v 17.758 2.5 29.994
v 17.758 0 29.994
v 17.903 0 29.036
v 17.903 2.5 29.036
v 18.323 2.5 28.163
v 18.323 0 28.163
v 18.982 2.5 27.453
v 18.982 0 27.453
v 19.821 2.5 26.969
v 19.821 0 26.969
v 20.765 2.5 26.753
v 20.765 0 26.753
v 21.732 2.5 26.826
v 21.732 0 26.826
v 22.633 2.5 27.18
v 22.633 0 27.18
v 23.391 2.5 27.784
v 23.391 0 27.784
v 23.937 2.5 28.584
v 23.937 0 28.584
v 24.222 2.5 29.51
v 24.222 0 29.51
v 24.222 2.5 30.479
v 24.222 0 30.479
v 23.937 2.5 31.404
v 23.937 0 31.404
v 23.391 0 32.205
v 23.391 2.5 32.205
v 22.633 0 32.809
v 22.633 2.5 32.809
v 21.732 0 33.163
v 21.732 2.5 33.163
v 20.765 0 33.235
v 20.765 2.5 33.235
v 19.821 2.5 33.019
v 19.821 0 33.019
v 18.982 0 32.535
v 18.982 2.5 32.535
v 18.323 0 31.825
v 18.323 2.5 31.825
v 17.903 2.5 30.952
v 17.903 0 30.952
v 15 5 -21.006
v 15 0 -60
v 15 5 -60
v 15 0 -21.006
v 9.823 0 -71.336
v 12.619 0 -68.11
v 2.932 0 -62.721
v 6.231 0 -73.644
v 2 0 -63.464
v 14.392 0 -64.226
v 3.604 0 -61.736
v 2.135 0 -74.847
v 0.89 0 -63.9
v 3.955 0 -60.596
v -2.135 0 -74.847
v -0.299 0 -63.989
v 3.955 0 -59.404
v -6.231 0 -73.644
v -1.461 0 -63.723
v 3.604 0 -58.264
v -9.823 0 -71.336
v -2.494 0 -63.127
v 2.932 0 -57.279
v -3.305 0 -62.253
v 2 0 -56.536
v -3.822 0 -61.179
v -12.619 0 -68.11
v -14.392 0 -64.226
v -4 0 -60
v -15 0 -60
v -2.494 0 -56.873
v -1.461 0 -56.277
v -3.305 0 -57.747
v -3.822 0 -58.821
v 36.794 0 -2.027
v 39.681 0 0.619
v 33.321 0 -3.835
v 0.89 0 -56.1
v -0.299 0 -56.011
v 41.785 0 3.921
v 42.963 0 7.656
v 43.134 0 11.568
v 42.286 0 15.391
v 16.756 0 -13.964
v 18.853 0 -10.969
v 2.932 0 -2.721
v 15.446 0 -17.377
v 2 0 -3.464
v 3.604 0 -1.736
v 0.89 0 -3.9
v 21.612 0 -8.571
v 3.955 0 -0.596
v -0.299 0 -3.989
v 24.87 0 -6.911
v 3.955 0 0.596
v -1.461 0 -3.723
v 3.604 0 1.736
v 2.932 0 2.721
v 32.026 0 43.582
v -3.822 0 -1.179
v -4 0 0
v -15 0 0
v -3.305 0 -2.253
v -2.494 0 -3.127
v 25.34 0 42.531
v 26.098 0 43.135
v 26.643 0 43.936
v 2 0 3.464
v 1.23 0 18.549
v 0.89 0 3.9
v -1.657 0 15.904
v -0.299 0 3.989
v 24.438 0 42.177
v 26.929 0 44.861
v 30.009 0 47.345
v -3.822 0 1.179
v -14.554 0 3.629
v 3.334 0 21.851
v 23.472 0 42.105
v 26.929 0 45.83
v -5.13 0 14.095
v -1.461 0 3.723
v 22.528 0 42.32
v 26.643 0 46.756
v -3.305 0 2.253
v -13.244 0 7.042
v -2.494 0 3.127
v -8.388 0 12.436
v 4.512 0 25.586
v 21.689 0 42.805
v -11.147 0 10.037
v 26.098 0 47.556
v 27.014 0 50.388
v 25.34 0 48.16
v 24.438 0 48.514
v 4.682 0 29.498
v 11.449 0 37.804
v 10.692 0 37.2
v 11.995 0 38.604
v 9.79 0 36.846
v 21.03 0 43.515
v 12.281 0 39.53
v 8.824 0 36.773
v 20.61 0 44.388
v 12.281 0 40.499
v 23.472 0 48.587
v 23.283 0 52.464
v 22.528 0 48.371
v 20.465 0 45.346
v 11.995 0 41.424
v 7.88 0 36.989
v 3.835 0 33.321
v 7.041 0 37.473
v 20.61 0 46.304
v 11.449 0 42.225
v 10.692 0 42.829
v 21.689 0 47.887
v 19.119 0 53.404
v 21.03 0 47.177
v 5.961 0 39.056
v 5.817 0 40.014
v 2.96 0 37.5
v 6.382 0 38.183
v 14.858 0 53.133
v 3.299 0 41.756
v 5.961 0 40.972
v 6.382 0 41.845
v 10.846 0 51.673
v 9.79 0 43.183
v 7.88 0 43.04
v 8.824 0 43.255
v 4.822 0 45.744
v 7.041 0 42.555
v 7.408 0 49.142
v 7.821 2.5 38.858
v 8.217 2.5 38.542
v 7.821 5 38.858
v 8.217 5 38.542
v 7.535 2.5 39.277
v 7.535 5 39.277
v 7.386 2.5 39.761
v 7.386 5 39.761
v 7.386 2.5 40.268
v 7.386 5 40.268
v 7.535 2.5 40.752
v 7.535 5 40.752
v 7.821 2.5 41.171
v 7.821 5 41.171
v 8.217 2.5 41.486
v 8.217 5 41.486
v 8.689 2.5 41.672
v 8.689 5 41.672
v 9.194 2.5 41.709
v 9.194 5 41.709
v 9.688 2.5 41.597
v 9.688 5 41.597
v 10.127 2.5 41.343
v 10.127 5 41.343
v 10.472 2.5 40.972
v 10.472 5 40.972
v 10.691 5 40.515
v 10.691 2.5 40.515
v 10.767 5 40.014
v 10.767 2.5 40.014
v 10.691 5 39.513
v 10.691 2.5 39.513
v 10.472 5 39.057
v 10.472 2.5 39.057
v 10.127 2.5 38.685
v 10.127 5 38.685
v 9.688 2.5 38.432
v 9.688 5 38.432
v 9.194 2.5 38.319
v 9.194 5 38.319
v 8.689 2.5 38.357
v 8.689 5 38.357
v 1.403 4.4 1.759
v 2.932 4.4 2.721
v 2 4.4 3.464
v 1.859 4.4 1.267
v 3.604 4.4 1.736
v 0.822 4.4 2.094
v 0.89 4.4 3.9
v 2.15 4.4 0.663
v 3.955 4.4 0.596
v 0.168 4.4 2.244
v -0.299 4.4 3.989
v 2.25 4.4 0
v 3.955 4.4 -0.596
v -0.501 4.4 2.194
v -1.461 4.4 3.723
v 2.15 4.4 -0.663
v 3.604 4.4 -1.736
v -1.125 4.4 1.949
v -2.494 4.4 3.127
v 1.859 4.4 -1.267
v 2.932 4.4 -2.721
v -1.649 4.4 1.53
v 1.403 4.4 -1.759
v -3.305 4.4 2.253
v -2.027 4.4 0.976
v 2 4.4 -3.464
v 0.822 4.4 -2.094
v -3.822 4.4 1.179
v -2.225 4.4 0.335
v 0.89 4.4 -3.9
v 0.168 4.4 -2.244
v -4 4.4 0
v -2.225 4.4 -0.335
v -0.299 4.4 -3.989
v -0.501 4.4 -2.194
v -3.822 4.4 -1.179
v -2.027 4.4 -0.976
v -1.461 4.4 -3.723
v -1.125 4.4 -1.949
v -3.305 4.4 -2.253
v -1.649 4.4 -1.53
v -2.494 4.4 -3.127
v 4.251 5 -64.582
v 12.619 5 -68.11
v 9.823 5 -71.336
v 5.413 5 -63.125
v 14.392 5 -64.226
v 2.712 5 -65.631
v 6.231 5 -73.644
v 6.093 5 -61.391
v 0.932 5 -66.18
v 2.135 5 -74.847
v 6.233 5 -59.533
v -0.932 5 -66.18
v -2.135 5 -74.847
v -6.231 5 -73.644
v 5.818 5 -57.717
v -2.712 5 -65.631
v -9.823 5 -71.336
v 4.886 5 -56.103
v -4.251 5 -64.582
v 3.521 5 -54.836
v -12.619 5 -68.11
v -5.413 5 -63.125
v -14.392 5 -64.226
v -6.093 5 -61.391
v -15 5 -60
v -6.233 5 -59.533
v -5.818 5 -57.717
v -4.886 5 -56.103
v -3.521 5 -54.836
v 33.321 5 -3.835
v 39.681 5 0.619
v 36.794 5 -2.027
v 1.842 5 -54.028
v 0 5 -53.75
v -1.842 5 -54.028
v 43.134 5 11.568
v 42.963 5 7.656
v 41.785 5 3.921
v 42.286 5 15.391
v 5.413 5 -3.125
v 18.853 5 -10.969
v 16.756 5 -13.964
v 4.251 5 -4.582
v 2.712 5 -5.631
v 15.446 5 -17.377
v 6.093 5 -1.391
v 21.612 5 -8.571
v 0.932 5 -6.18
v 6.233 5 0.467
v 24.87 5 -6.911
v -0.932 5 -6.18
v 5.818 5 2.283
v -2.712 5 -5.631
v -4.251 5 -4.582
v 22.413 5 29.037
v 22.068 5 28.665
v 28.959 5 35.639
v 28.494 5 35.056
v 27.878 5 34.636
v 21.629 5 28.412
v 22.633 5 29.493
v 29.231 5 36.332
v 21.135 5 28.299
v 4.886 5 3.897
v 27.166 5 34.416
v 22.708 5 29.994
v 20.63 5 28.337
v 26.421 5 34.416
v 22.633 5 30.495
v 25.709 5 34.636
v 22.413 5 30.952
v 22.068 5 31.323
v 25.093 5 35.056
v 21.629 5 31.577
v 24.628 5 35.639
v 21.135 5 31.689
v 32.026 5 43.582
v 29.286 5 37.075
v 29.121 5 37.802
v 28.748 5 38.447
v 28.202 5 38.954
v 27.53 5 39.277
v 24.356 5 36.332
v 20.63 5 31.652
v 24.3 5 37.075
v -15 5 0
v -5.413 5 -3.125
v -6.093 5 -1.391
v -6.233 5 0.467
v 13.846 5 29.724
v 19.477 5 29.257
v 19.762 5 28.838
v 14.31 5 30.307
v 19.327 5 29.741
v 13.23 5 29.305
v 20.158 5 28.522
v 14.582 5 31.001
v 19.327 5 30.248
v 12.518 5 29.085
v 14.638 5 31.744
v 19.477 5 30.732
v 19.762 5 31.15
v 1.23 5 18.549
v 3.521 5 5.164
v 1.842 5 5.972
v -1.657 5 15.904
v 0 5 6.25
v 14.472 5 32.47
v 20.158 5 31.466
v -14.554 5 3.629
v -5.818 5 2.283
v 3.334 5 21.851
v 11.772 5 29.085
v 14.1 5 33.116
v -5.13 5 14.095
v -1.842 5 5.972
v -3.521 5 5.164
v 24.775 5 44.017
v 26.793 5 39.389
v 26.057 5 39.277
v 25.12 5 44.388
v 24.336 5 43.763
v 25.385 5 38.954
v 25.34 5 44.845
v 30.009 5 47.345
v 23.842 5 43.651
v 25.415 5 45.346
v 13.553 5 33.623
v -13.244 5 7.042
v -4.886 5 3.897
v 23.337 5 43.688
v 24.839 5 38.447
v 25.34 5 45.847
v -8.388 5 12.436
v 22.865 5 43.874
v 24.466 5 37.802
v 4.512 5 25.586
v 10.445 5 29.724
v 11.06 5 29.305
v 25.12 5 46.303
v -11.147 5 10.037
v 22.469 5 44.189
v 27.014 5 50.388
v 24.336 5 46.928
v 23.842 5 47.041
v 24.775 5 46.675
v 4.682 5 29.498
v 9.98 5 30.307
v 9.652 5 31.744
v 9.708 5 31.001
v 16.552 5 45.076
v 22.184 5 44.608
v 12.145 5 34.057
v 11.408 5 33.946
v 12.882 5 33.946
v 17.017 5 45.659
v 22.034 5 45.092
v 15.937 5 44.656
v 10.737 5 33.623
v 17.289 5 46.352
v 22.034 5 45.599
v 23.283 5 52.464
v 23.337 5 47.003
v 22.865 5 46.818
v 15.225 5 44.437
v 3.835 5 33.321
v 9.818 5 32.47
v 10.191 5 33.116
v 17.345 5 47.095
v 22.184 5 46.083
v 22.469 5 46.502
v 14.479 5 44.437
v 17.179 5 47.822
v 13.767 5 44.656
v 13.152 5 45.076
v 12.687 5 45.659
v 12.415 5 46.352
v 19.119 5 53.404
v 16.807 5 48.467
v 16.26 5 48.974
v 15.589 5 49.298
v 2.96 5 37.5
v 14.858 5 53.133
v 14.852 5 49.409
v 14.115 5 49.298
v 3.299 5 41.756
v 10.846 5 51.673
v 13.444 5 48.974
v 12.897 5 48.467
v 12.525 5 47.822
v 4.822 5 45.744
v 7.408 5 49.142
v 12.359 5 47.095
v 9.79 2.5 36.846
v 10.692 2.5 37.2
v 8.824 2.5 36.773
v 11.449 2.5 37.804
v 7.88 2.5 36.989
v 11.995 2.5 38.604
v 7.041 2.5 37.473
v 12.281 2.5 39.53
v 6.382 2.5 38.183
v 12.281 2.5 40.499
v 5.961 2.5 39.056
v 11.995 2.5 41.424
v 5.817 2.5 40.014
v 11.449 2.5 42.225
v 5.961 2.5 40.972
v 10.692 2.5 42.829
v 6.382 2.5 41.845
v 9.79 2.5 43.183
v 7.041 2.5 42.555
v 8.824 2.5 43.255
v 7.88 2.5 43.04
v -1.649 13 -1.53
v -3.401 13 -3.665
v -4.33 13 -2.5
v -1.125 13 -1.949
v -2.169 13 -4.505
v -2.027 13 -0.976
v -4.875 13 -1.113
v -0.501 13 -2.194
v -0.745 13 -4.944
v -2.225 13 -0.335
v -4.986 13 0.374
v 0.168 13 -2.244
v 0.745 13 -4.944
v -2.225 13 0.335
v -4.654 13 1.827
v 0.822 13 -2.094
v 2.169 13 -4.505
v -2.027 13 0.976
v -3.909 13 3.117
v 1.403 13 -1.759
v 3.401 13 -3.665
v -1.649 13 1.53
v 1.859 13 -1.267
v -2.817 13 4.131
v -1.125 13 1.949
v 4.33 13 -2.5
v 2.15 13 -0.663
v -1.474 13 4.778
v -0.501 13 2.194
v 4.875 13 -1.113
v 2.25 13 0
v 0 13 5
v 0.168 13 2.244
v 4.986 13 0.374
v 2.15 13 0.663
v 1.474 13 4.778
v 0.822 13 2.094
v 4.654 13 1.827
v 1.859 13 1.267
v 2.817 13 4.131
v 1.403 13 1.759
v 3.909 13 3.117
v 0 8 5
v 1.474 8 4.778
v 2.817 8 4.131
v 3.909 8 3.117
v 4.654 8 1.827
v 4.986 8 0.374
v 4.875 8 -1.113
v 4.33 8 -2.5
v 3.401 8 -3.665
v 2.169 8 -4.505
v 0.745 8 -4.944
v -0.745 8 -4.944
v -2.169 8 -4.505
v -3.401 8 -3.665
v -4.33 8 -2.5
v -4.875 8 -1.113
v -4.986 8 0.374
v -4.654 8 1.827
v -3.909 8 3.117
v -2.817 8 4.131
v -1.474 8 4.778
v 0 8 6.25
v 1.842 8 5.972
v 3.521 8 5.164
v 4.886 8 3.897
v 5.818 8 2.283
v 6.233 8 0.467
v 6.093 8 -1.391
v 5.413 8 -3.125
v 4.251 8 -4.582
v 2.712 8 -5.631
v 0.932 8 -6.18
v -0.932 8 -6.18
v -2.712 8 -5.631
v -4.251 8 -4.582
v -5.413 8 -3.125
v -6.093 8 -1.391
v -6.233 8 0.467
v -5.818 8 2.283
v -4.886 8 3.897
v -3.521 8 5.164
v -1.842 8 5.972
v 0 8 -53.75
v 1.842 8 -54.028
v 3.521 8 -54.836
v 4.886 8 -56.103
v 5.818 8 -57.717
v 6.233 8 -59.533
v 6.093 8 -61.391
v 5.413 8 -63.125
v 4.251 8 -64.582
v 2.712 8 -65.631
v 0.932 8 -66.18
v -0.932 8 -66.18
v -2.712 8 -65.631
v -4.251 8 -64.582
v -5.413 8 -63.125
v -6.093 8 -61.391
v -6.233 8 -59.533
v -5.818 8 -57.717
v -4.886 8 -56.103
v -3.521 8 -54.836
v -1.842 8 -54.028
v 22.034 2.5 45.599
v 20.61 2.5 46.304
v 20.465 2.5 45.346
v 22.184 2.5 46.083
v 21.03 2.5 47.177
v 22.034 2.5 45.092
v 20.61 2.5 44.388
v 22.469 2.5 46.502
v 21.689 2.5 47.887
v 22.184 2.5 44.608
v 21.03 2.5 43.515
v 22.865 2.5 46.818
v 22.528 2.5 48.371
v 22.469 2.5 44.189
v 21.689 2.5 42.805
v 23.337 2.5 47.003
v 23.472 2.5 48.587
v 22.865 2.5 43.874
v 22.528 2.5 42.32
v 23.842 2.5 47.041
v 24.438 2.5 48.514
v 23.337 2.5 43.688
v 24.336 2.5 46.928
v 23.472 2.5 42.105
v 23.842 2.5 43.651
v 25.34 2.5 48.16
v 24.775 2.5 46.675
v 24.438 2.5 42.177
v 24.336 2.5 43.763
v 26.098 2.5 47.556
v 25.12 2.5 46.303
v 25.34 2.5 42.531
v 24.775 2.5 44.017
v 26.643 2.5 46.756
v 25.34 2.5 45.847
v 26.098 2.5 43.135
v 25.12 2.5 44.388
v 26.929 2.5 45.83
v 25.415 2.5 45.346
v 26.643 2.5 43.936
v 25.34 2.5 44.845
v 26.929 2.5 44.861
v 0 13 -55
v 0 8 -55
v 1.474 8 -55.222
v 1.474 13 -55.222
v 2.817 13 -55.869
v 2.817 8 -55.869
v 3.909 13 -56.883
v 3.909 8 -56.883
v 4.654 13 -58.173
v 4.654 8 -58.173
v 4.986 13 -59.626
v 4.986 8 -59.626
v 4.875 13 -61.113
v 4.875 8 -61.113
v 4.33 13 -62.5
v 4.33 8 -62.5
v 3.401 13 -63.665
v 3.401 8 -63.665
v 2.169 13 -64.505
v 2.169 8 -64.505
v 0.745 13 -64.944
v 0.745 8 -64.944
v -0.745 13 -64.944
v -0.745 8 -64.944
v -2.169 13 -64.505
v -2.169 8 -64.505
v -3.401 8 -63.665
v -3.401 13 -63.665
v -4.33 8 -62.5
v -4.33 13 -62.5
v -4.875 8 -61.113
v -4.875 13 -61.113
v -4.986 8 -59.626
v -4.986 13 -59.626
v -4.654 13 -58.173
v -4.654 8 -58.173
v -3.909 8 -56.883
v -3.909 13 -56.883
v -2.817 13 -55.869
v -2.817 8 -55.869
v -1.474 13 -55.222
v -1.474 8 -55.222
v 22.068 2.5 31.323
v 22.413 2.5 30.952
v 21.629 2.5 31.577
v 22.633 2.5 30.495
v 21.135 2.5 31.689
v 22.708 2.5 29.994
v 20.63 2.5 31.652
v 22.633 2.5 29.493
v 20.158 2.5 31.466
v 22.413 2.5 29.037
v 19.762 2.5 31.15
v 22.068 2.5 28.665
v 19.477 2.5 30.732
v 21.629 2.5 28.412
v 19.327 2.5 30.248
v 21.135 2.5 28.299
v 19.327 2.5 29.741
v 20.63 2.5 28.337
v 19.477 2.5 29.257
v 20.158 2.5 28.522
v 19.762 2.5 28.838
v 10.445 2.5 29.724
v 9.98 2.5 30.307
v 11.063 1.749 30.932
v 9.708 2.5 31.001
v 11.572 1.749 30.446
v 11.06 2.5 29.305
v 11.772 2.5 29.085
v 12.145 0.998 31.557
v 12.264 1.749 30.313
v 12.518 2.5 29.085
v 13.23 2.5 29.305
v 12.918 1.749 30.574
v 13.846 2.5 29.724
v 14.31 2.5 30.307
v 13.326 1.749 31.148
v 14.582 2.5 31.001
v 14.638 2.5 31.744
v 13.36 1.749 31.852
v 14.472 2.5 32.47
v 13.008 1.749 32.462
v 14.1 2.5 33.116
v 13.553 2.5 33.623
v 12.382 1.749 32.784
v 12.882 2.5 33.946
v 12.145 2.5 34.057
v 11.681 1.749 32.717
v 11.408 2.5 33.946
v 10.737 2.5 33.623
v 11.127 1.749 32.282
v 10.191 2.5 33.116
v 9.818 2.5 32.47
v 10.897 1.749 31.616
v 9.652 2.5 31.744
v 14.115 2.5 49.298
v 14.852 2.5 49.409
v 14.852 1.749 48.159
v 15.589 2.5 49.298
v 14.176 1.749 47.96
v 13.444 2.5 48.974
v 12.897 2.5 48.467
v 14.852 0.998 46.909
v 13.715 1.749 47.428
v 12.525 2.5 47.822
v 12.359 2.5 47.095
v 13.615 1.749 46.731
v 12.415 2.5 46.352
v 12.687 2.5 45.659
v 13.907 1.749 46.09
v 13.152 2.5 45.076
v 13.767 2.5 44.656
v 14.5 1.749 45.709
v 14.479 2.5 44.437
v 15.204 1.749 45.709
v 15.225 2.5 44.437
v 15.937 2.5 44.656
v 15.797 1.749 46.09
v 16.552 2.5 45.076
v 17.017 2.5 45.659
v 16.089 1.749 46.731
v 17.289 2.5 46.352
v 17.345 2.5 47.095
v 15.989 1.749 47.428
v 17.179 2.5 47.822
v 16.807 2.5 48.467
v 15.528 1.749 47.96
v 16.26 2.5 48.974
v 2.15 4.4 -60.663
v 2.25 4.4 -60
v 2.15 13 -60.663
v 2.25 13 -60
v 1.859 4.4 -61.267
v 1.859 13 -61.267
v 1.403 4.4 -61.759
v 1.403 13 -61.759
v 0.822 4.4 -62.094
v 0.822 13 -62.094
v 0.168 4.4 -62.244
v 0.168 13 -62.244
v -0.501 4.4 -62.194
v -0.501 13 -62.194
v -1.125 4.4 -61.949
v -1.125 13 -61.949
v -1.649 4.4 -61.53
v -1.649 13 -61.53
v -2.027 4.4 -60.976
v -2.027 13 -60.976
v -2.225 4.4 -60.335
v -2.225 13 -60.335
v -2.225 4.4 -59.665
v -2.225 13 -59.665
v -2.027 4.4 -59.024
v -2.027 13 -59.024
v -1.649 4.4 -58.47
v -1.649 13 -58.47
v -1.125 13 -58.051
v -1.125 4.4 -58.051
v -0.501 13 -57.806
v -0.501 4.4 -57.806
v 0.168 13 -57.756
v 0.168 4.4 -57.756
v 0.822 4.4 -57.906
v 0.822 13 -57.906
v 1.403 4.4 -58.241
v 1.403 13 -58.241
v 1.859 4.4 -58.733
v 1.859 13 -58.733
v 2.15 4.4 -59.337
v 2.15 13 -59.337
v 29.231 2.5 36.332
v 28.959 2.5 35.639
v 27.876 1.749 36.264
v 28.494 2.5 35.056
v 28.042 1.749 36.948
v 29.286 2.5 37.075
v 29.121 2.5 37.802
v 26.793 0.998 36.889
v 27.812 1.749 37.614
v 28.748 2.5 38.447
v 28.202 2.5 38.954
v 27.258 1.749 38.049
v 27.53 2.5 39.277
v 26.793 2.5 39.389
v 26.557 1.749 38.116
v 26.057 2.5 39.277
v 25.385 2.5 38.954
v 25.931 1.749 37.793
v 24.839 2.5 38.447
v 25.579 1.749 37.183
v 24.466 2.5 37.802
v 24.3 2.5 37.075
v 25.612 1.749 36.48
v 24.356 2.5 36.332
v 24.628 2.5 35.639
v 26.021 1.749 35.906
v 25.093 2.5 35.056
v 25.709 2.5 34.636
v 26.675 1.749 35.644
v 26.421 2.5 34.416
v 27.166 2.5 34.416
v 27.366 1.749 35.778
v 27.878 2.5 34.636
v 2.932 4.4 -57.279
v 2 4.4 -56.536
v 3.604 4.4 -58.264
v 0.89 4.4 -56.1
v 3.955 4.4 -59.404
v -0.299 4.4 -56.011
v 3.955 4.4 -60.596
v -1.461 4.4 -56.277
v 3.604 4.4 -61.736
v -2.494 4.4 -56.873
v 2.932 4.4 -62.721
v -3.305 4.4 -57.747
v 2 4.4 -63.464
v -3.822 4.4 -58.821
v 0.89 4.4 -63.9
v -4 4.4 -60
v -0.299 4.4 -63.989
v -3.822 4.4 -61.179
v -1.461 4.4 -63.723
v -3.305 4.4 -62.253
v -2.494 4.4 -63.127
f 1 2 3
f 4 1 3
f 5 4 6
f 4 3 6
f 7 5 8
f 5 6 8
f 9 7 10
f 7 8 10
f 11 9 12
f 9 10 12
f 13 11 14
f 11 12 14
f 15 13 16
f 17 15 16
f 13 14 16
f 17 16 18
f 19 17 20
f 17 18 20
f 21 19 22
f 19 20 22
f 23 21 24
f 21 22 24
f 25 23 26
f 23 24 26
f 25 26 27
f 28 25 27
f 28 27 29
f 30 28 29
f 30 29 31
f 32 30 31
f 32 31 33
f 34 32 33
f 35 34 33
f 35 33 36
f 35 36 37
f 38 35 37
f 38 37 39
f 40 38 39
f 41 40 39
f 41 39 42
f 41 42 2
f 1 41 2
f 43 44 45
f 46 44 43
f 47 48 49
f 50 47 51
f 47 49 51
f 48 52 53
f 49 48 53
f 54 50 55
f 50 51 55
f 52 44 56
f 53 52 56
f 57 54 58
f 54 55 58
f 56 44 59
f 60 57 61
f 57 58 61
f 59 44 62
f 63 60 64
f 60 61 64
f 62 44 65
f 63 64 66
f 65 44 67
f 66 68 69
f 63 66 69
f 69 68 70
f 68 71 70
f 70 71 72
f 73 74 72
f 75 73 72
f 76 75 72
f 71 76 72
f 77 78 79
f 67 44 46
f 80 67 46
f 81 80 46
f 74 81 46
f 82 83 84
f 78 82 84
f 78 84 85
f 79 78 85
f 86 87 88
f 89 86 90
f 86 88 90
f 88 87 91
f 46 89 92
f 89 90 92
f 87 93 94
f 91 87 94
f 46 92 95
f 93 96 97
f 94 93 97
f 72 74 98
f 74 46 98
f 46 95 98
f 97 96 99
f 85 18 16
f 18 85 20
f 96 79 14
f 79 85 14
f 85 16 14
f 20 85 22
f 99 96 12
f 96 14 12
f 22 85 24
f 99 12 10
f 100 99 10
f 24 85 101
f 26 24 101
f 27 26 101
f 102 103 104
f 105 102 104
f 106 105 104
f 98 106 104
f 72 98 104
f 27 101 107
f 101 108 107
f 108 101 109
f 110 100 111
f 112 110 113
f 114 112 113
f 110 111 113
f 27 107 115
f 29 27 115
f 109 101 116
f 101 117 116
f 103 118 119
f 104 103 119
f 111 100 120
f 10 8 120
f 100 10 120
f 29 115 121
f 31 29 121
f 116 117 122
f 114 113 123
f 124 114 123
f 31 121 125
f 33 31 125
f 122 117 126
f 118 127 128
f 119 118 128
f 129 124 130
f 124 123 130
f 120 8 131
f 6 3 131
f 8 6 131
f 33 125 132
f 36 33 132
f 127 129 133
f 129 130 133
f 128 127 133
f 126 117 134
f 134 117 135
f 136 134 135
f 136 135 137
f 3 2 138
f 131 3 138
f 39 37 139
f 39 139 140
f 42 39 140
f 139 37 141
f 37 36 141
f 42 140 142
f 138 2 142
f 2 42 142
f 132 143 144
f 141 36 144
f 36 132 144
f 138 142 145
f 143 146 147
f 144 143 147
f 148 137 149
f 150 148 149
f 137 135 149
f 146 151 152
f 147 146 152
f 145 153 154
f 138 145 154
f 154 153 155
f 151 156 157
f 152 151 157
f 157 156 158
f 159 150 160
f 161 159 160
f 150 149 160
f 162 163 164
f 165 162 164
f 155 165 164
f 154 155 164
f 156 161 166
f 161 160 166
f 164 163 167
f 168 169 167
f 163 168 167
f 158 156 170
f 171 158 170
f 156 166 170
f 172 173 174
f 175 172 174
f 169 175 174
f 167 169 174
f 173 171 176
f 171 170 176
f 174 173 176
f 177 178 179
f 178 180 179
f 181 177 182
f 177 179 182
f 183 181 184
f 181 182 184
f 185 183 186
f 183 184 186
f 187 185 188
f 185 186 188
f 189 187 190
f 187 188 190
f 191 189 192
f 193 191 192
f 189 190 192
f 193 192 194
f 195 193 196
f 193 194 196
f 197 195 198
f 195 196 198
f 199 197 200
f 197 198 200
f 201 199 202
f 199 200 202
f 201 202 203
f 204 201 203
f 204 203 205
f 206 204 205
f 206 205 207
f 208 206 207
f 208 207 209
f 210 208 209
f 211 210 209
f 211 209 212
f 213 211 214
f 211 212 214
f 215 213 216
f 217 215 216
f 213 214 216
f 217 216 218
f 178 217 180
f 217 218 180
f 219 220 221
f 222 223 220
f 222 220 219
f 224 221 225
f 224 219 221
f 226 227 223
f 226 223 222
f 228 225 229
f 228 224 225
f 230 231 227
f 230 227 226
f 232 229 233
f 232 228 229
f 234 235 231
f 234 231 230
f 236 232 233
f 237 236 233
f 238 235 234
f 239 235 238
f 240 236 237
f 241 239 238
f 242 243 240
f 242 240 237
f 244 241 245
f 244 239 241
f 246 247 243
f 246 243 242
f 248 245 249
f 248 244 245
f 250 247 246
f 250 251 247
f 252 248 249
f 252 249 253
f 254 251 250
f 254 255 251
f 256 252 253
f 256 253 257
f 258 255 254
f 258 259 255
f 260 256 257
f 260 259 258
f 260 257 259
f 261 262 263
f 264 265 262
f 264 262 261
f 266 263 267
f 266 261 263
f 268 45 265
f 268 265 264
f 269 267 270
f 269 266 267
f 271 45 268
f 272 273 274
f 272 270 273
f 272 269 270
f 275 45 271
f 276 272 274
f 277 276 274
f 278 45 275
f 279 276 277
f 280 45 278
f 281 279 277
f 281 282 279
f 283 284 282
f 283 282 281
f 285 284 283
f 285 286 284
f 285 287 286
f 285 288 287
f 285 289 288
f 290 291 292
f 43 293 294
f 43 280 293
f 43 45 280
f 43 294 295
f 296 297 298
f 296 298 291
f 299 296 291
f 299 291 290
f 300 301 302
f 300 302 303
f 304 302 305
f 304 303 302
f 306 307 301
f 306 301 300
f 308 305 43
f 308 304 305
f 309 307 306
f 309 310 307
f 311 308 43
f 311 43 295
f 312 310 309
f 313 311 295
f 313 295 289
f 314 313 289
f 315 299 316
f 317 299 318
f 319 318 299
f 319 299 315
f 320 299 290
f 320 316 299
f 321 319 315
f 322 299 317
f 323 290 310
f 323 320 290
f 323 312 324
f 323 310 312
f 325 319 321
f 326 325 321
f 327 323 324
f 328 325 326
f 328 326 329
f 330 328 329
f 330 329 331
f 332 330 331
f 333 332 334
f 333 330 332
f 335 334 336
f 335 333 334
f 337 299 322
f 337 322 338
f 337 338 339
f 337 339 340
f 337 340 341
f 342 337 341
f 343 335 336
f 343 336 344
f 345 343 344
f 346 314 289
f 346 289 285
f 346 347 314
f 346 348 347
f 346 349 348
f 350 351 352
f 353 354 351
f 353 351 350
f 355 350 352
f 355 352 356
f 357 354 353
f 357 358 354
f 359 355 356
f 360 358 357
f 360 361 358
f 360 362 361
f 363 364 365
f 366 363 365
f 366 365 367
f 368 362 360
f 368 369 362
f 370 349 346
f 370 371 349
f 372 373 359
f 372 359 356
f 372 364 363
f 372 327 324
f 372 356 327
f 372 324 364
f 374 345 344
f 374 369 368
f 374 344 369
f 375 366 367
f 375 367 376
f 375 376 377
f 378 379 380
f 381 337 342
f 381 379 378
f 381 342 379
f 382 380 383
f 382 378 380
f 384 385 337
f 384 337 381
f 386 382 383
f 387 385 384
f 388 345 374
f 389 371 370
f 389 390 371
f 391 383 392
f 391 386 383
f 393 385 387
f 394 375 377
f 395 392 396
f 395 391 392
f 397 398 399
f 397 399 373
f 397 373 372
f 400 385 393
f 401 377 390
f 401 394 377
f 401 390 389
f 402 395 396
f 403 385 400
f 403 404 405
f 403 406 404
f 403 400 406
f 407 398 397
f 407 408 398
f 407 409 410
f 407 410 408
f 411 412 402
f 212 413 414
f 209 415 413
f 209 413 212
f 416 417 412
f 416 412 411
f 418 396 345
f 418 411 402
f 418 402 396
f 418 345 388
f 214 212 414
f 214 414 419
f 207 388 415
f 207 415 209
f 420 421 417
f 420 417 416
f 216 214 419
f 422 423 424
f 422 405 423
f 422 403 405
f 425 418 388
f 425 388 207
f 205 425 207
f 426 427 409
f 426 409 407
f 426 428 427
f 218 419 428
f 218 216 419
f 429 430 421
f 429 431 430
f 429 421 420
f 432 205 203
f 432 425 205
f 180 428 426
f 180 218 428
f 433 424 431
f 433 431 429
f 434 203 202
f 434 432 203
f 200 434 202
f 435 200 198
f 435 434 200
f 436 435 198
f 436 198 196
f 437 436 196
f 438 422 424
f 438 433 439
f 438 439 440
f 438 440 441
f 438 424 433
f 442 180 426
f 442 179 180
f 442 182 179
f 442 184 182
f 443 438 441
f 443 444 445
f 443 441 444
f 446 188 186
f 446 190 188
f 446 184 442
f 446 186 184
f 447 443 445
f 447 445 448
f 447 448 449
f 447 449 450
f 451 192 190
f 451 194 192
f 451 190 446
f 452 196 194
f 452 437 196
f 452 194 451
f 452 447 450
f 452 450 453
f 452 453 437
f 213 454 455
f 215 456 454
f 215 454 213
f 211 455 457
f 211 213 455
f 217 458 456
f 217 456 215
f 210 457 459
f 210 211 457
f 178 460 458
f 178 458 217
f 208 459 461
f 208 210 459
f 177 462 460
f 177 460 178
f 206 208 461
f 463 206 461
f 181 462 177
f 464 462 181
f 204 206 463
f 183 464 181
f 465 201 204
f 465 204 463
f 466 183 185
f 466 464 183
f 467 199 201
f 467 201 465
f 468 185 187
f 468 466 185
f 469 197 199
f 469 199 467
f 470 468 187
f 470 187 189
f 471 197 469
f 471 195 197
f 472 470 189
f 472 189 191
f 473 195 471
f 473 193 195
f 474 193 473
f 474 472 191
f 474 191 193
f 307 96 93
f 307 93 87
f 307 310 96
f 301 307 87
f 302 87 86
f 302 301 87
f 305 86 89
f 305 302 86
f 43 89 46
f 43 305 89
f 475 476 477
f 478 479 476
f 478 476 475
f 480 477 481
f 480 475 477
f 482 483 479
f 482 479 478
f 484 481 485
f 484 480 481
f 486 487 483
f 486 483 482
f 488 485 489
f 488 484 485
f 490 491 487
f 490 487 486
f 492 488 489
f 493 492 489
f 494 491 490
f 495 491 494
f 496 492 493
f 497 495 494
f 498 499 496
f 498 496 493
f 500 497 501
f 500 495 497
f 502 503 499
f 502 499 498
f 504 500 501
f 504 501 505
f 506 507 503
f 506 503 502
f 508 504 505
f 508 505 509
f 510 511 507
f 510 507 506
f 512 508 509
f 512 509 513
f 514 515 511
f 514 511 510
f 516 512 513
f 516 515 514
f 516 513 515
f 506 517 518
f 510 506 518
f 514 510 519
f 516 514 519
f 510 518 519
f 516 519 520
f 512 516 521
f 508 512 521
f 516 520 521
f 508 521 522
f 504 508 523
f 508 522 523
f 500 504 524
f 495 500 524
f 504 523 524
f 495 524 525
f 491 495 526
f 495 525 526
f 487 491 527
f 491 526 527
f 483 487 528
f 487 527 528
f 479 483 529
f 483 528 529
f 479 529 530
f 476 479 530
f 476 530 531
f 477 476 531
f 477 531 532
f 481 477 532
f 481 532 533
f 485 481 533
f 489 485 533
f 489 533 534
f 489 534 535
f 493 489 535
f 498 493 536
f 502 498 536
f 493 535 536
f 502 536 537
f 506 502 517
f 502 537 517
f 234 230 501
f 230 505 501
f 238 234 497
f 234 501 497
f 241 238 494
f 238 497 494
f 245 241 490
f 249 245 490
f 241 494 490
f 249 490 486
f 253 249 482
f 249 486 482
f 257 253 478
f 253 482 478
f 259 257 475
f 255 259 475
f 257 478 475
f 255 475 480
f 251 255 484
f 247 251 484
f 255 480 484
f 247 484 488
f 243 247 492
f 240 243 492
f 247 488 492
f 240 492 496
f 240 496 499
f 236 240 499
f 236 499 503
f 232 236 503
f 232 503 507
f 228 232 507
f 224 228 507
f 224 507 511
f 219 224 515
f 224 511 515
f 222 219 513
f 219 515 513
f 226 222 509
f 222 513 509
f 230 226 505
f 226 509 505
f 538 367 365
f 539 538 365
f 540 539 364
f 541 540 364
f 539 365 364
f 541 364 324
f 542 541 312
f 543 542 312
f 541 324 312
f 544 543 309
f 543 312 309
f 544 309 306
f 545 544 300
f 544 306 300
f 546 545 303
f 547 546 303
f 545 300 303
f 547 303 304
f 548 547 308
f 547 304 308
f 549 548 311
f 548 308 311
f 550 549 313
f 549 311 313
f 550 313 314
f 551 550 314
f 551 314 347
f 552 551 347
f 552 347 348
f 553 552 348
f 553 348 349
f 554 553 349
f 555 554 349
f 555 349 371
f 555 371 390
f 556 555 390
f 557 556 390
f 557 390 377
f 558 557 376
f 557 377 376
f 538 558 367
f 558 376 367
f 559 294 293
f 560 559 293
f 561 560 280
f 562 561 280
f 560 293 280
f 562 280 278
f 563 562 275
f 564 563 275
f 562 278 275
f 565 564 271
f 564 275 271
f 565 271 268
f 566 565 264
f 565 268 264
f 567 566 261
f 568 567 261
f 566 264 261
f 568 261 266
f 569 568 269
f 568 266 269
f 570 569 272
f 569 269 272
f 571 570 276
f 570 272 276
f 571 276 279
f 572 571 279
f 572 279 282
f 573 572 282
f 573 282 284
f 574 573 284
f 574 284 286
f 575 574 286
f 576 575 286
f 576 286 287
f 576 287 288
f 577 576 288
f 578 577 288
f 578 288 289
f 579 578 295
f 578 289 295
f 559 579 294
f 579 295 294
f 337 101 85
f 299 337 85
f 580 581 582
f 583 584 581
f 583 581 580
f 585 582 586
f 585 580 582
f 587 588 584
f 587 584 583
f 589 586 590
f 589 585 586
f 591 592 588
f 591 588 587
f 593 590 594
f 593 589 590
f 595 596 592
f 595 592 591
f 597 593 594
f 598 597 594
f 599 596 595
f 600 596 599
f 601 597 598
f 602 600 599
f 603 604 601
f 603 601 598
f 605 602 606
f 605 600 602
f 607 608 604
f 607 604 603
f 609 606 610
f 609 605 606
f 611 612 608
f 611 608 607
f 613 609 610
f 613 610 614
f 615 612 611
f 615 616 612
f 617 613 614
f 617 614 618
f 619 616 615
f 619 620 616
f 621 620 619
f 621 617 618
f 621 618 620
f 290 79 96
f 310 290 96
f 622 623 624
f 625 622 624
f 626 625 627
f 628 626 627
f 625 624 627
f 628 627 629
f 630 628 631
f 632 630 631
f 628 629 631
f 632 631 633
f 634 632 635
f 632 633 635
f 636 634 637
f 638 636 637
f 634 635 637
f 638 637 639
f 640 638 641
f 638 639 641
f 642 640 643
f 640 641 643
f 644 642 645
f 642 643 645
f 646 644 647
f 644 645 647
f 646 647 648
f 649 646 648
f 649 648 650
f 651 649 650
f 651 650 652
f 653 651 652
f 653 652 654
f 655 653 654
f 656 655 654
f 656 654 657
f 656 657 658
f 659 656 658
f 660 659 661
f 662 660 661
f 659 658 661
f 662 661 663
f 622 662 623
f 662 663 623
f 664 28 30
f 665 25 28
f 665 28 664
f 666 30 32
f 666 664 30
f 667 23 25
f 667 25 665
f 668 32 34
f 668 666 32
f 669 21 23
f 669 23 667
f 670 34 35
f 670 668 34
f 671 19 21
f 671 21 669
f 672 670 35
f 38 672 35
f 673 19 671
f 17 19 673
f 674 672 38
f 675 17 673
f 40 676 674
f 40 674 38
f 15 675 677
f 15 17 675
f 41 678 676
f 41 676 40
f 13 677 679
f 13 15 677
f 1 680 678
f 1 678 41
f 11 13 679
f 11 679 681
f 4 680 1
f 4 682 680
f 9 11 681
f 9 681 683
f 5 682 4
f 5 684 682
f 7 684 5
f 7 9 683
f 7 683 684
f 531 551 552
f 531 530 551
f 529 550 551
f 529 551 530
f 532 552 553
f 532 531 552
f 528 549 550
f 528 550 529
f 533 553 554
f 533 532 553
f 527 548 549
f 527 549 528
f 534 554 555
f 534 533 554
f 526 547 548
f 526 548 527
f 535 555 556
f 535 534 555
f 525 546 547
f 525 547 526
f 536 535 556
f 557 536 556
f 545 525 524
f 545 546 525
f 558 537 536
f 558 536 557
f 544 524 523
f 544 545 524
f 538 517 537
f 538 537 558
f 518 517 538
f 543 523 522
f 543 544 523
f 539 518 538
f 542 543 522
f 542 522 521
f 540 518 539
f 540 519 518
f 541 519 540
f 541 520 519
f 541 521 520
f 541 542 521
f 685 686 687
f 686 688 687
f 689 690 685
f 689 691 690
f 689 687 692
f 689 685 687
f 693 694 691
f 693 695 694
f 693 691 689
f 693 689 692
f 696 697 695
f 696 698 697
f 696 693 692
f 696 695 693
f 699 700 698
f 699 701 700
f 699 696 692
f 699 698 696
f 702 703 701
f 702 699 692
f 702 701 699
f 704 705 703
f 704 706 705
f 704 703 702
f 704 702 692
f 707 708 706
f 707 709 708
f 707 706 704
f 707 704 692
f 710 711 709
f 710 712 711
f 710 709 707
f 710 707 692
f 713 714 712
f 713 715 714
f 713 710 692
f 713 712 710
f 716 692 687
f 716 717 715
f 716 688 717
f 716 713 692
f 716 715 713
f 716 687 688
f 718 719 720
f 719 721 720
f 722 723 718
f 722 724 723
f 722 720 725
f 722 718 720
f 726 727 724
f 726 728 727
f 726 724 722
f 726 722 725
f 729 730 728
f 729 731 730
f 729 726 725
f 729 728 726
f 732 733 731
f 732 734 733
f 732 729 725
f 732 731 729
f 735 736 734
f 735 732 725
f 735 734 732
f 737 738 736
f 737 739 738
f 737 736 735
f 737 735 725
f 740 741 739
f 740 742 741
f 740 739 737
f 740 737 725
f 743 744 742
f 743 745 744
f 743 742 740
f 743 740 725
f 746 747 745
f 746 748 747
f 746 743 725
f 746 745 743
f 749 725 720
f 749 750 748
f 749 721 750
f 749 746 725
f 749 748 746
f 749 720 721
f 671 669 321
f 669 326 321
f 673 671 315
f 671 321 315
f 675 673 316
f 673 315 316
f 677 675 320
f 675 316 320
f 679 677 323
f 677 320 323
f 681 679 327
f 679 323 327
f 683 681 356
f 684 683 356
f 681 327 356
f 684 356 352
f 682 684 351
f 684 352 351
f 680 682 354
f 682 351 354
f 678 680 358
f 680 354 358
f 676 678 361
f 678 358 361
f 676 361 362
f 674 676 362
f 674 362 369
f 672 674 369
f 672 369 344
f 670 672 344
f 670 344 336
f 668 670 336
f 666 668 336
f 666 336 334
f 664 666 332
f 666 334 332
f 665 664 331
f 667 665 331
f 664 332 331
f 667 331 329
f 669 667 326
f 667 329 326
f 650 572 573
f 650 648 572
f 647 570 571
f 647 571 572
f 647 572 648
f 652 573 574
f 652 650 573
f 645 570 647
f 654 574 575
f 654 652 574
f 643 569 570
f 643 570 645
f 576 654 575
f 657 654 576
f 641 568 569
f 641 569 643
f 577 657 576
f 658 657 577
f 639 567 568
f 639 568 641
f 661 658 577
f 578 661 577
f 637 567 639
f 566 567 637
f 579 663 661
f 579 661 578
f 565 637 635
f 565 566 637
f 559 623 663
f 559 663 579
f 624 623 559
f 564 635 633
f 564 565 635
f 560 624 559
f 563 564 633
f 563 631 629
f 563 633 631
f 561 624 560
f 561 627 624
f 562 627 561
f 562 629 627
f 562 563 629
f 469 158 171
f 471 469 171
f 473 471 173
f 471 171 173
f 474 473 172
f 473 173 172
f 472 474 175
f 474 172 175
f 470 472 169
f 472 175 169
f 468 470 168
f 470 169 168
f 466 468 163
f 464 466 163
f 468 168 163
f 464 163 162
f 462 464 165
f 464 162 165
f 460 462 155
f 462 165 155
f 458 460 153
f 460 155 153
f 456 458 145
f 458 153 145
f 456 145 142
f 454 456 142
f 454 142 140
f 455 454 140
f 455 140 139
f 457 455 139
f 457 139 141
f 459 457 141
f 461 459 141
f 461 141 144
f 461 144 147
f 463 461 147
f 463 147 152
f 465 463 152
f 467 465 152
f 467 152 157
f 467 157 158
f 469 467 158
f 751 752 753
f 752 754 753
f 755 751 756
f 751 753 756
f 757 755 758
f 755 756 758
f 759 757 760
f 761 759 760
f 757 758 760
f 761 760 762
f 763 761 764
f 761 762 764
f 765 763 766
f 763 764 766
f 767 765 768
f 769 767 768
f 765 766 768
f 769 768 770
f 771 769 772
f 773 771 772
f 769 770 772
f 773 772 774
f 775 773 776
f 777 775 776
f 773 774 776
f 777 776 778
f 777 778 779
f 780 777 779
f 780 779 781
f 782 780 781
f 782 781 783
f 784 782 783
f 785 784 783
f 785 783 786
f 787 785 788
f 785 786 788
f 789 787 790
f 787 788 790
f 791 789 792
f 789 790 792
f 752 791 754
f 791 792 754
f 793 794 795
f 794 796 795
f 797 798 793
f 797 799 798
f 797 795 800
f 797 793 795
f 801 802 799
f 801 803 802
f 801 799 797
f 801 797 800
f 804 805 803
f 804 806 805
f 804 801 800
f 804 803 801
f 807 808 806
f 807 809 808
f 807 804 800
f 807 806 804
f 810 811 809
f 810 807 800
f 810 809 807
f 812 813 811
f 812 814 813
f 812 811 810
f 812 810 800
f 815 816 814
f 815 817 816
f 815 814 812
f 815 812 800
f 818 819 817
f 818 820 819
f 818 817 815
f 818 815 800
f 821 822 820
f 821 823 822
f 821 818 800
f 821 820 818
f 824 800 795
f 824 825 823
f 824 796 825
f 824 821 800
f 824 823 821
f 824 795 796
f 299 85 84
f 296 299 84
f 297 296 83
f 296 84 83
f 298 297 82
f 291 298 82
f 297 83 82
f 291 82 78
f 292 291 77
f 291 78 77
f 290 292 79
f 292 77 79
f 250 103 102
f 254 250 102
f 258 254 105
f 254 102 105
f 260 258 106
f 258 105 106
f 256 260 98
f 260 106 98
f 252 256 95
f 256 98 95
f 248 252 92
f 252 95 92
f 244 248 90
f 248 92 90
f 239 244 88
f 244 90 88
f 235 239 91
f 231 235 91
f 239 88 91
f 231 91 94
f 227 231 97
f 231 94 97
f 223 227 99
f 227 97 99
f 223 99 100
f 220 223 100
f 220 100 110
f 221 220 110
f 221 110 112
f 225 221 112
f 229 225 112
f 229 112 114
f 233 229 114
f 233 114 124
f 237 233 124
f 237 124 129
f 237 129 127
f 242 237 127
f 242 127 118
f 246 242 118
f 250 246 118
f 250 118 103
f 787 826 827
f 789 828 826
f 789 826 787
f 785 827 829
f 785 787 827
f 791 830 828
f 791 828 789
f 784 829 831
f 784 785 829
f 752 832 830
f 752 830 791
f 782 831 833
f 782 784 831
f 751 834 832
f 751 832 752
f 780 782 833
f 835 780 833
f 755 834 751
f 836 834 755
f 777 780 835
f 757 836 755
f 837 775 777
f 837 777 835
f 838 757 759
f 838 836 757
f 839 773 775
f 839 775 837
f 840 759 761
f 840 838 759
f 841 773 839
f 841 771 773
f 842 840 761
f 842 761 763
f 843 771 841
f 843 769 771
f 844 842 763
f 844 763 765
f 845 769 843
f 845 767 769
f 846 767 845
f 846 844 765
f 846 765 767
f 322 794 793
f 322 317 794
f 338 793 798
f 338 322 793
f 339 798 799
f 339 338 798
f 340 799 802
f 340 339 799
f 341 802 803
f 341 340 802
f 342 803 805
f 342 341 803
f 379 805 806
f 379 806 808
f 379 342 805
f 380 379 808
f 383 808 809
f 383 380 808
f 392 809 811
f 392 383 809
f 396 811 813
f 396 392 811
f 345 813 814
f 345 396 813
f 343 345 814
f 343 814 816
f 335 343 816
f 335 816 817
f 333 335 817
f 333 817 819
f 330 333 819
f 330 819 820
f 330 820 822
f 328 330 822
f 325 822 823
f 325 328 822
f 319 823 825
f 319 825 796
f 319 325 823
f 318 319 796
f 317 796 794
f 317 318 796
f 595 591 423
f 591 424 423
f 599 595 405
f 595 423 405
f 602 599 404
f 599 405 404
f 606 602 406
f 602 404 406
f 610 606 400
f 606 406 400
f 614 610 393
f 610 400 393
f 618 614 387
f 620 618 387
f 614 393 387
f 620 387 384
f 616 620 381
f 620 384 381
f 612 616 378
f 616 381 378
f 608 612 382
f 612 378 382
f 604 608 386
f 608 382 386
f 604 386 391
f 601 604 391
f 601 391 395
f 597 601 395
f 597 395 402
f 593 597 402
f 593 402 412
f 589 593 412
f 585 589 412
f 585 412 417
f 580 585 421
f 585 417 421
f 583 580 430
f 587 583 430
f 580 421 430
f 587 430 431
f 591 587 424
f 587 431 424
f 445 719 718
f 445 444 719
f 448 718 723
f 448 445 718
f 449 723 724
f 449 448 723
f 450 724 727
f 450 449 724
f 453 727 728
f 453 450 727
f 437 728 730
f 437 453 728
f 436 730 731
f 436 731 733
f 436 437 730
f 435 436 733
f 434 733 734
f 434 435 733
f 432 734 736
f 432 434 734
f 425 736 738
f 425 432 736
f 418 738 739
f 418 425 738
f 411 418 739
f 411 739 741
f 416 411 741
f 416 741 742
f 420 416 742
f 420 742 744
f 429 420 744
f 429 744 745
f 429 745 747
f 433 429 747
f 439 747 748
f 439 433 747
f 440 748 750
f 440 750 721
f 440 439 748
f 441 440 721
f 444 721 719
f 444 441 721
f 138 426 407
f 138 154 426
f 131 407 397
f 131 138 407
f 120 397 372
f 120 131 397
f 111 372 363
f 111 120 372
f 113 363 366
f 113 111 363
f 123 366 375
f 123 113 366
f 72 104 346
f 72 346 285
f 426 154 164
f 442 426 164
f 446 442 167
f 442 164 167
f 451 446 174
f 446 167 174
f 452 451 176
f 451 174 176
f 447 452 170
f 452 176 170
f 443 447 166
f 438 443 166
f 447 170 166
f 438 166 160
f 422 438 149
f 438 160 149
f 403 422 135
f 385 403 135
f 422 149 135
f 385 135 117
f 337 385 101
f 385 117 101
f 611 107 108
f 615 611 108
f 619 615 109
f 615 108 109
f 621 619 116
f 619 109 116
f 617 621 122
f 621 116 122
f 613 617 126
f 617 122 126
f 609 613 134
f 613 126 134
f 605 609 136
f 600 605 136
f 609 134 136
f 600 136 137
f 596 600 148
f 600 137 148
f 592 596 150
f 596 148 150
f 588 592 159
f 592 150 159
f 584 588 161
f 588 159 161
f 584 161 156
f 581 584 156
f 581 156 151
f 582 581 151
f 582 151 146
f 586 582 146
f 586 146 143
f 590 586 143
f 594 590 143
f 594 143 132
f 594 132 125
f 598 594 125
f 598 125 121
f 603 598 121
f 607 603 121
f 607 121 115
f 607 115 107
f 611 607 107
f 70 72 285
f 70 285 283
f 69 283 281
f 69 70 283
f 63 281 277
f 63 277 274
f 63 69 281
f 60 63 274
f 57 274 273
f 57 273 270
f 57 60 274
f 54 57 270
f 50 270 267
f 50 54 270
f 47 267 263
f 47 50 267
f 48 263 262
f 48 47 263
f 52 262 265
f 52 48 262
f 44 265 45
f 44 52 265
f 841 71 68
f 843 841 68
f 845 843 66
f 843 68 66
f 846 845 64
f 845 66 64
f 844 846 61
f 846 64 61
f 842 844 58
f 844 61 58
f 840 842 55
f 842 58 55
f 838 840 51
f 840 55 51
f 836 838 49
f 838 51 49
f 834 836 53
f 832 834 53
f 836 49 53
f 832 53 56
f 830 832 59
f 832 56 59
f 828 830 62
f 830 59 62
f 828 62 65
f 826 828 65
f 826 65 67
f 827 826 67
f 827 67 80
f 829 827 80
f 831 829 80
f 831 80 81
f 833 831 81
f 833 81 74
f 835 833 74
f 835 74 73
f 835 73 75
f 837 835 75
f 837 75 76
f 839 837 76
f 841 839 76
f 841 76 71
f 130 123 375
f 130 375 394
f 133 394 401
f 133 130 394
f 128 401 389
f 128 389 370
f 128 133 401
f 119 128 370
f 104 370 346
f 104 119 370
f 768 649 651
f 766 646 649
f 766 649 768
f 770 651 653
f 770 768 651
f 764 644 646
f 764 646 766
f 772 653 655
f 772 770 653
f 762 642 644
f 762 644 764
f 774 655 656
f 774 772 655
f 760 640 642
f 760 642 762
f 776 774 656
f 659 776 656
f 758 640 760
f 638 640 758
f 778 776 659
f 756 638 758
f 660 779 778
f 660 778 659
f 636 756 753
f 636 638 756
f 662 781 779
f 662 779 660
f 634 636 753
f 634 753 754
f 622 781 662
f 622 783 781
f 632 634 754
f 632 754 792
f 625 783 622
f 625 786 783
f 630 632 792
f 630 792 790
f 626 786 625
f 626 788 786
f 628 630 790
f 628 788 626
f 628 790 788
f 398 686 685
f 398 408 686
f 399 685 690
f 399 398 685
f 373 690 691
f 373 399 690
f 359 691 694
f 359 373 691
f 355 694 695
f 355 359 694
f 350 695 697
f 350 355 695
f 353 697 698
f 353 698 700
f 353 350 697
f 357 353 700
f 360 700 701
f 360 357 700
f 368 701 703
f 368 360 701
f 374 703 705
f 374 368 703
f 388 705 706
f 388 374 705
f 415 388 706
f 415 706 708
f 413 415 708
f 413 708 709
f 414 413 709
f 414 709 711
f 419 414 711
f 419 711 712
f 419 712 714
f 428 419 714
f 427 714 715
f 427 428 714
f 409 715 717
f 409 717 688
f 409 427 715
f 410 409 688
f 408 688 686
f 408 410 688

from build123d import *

# Parameters (mm, degrees)
EXTRUDE_1_DEPTH              = 5
SKETCH_2_R                   = 6.25
EXTRUDE_2_DEPTH              = 3
SKETCH_3_R                   = 5
EXTRUDE_3_DEPTH              = 5
HOLE_WIZARD_M4_3_D           = 4.5
HOLE_WIZARD_M4_3_CBORE_D     = 8
HOLE_WIZARD_M4_3_CBORE_DEPTH = 4.4
EXTRUDE_4_DEPTH              = 5
EXTRUDE_5_DEPTH              = 5
HOLE_WIZARD_M4_2_D           = 4.5
HOLE_WIZARD_M4_2_CBORE_D     = 8
HOLE_WIZARD_M4_2_CBORE_DEPTH = 4.4
HOLE_WIZARD_M3_1_D           = 3.4
HOLE_WIZARD_M3_1_CBORE_D     = 6.5
HOLE_WIZARD_M3_1_CBORE_DEPTH = 2.5
PATTERN_CIRCULAR_1_COUNT     = 3
PATTERN_CIRCULAR_2_COUNT     = 3
FILLET_2_R                   = 15


with BuildPart() as part:
    # 스케치1 → 보스-돌출1 (new body)
    with BuildSketch(Plane(origin=(0, 0, 0), x_dir=(1, 0, 0), z_dir=(0, 1, 0))):
        with BuildLine():
            Line((-15, 0), (-15, 60))
            ThreePointArc((-15, 60), (0, 75), (15, 60))
            Line((15, 60), (15, 0))
            ThreePointArc((15, 0), (0, -15), (-15, 0))
        make_face()
    extrude(amount=EXTRUDE_1_DEPTH)

    # 스케치2 → 보스-돌출2 (add)
    with BuildSketch(Plane(origin=(0, 5, 0), x_dir=(1, 0, 0), z_dir=(0, 1, 0))):
        with Locations(Location((0, 60, 0), (0, 0, 270))):
            Circle(SKETCH_2_R)
        with Locations(Location((0, 0, 0), (0, 0, 270))):
            Circle(SKETCH_2_R)
    extrude(amount=EXTRUDE_2_DEPTH)

    # 스케치3 → 보스-돌출3 (add)
    with BuildSketch(Plane(origin=(0, 8, 0), x_dir=(1, 0, 0), z_dir=(0, 1, 0))):
        with Locations(Location((0, 60, 0), (0, 0, 270))):
            Circle(SKETCH_3_R)
        with Locations(Location((0, 0, 0), (0, 0, 270))):
            Circle(SKETCH_3_R)
    extrude(amount=EXTRUDE_3_DEPTH)

    # M4 육각 소켓 머리 캡 나사용 카운터보어3 (through all)
    with Locations(Plane(origin=(0, 0, 0), x_dir=(-1, 0, 0), z_dir=(0, -1, 0))):
        with Locations((0, 60), (0, -25)):
            CounterBoreHole(HOLE_WIZARD_M4_3_D / 2, HOLE_WIZARD_M4_3_CBORE_D / 2, HOLE_WIZARD_M4_3_CBORE_DEPTH)

    # 스케치8 → 보스-돌출4 (add)
    with BuildSketch(Plane.XZ):
        with BuildLine():
            Line((-5.13030215, 14.095389312), (23.060476474, 24.355993612))
            ThreePointArc((23.060476474, 24.355993612), (42.286167935, 15.39090645), (33.321080773, -3.834785012))
            Line((33.321080773, -3.834785012), (15, -10.503113073))
            Line((15, -10.503113073), (15, 0))
            ThreePointArc((15, 0), (8.603646545, 12.287280664), (-5.13030215, 14.095389312))
        make_face()
    extrude(amount=-EXTRUDE_4_DEPTH)

    # 스케치9 → 보스-돌출5 (add)
    with BuildSketch(Plane.XZ):
        with BuildLine():
            Line((14.095389312, 5.13030215), (3.834785012, 33.321080773))
            ThreePointArc((3.834785012, 33.321080773), (12.799872174, 52.546772235), (32.025563636, 43.581685073))
            Line((32.025563636, 43.581685073), (42.286167935, 15.39090645))
            ThreePointArc((42.286167935, 15.39090645), (33.321080773, -3.834785012), (14.095389312, 5.13030215))
        make_face()
    extrude(amount=-EXTRUDE_5_DEPTH)

    # M4 육각 소켓 머리 캡 나사용 카운터보어2 (through all)
    with Locations(Plane(origin=(0, 0, 0), x_dir=(-1, 0, 0), z_dir=(0, -1, 0))):
        with Locations((0, 0)):
            CounterBoreHole(HOLE_WIZARD_M4_2_D / 2, HOLE_WIZARD_M4_2_CBORE_D / 2, HOLE_WIZARD_M4_2_CBORE_DEPTH)

    # M3 육각 소켓 머리 캡 나사용 카운터보어1 (through all)
    with Locations(Plane(origin=(0, 0, 0), x_dir=(-1, 0, 0), z_dir=(0, -1, 0))):
        with Locations((-21.008355614, -29.994149336)):
            hole_wizard_m3_1 = CounterBoreHole(HOLE_WIZARD_M3_1_D / 2, HOLE_WIZARD_M3_1_CBORE_D / 2, HOLE_WIZARD_M3_1_CBORE_DEPTH)

    # 원형 패턴1: M3 육각 소켓 머리 캡 나사용 카운터보어1 ×3 about axis
    pattern_circular_1_axis = Axis((17.930174324, 0, 38.451382923), (0, 1, 0))
    for i in range(1, PATTERN_CIRCULAR_1_COUNT):
        add(hole_wizard_m3_1.rotate(pattern_circular_1_axis, i * 360 / PATTERN_CIRCULAR_1_COUNT), mode=Mode.SUBTRACT)

    # 스케치36 → Ø5.0mm 맞춤핀 구멍1 (revolve, cut)
    with BuildSketch(Plane(origin=(14.851993034, 5, 46.90861651), x_dir=(0, 0, 1), z_dir=(1, 0, 0))):
        Polygon((0, 0), (0, 4.002151548), (2.5, 2.5), (2.5, 0), align=None)
    f_5_0mm_1 = revolve(axis=Axis((14.851993034, 11.35, 46.90861651), (0, -1, 0)), mode=Mode.SUBTRACT)

    # 원형 패턴2: Ø5.0mm 맞춤핀 구멍1 ×3 about axis
    pattern_circular_2_axis = Axis((17.930174324, 0, 38.451382923), (0, 1, 0))
    for i in range(1, PATTERN_CIRCULAR_2_COUNT):
        add(f_5_0mm_1.rotate(pattern_circular_2_axis, i * 360 / PATTERN_CIRCULAR_2_COUNT), mode=Mode.SUBTRACT)

    # 필렛2
    fillet_2_edges = [part.edges().sort_by_distance(p)[0] for p in [
        (15, 2.5, -10.503113073),
        (8.965087162, 2.5, 19.225691462),
    ]]
    fillet(fillet_2_edges, radius=FILLET_2_R - 0.0001)  # a hair under: the kernel refuses the full size


solid = part.part
